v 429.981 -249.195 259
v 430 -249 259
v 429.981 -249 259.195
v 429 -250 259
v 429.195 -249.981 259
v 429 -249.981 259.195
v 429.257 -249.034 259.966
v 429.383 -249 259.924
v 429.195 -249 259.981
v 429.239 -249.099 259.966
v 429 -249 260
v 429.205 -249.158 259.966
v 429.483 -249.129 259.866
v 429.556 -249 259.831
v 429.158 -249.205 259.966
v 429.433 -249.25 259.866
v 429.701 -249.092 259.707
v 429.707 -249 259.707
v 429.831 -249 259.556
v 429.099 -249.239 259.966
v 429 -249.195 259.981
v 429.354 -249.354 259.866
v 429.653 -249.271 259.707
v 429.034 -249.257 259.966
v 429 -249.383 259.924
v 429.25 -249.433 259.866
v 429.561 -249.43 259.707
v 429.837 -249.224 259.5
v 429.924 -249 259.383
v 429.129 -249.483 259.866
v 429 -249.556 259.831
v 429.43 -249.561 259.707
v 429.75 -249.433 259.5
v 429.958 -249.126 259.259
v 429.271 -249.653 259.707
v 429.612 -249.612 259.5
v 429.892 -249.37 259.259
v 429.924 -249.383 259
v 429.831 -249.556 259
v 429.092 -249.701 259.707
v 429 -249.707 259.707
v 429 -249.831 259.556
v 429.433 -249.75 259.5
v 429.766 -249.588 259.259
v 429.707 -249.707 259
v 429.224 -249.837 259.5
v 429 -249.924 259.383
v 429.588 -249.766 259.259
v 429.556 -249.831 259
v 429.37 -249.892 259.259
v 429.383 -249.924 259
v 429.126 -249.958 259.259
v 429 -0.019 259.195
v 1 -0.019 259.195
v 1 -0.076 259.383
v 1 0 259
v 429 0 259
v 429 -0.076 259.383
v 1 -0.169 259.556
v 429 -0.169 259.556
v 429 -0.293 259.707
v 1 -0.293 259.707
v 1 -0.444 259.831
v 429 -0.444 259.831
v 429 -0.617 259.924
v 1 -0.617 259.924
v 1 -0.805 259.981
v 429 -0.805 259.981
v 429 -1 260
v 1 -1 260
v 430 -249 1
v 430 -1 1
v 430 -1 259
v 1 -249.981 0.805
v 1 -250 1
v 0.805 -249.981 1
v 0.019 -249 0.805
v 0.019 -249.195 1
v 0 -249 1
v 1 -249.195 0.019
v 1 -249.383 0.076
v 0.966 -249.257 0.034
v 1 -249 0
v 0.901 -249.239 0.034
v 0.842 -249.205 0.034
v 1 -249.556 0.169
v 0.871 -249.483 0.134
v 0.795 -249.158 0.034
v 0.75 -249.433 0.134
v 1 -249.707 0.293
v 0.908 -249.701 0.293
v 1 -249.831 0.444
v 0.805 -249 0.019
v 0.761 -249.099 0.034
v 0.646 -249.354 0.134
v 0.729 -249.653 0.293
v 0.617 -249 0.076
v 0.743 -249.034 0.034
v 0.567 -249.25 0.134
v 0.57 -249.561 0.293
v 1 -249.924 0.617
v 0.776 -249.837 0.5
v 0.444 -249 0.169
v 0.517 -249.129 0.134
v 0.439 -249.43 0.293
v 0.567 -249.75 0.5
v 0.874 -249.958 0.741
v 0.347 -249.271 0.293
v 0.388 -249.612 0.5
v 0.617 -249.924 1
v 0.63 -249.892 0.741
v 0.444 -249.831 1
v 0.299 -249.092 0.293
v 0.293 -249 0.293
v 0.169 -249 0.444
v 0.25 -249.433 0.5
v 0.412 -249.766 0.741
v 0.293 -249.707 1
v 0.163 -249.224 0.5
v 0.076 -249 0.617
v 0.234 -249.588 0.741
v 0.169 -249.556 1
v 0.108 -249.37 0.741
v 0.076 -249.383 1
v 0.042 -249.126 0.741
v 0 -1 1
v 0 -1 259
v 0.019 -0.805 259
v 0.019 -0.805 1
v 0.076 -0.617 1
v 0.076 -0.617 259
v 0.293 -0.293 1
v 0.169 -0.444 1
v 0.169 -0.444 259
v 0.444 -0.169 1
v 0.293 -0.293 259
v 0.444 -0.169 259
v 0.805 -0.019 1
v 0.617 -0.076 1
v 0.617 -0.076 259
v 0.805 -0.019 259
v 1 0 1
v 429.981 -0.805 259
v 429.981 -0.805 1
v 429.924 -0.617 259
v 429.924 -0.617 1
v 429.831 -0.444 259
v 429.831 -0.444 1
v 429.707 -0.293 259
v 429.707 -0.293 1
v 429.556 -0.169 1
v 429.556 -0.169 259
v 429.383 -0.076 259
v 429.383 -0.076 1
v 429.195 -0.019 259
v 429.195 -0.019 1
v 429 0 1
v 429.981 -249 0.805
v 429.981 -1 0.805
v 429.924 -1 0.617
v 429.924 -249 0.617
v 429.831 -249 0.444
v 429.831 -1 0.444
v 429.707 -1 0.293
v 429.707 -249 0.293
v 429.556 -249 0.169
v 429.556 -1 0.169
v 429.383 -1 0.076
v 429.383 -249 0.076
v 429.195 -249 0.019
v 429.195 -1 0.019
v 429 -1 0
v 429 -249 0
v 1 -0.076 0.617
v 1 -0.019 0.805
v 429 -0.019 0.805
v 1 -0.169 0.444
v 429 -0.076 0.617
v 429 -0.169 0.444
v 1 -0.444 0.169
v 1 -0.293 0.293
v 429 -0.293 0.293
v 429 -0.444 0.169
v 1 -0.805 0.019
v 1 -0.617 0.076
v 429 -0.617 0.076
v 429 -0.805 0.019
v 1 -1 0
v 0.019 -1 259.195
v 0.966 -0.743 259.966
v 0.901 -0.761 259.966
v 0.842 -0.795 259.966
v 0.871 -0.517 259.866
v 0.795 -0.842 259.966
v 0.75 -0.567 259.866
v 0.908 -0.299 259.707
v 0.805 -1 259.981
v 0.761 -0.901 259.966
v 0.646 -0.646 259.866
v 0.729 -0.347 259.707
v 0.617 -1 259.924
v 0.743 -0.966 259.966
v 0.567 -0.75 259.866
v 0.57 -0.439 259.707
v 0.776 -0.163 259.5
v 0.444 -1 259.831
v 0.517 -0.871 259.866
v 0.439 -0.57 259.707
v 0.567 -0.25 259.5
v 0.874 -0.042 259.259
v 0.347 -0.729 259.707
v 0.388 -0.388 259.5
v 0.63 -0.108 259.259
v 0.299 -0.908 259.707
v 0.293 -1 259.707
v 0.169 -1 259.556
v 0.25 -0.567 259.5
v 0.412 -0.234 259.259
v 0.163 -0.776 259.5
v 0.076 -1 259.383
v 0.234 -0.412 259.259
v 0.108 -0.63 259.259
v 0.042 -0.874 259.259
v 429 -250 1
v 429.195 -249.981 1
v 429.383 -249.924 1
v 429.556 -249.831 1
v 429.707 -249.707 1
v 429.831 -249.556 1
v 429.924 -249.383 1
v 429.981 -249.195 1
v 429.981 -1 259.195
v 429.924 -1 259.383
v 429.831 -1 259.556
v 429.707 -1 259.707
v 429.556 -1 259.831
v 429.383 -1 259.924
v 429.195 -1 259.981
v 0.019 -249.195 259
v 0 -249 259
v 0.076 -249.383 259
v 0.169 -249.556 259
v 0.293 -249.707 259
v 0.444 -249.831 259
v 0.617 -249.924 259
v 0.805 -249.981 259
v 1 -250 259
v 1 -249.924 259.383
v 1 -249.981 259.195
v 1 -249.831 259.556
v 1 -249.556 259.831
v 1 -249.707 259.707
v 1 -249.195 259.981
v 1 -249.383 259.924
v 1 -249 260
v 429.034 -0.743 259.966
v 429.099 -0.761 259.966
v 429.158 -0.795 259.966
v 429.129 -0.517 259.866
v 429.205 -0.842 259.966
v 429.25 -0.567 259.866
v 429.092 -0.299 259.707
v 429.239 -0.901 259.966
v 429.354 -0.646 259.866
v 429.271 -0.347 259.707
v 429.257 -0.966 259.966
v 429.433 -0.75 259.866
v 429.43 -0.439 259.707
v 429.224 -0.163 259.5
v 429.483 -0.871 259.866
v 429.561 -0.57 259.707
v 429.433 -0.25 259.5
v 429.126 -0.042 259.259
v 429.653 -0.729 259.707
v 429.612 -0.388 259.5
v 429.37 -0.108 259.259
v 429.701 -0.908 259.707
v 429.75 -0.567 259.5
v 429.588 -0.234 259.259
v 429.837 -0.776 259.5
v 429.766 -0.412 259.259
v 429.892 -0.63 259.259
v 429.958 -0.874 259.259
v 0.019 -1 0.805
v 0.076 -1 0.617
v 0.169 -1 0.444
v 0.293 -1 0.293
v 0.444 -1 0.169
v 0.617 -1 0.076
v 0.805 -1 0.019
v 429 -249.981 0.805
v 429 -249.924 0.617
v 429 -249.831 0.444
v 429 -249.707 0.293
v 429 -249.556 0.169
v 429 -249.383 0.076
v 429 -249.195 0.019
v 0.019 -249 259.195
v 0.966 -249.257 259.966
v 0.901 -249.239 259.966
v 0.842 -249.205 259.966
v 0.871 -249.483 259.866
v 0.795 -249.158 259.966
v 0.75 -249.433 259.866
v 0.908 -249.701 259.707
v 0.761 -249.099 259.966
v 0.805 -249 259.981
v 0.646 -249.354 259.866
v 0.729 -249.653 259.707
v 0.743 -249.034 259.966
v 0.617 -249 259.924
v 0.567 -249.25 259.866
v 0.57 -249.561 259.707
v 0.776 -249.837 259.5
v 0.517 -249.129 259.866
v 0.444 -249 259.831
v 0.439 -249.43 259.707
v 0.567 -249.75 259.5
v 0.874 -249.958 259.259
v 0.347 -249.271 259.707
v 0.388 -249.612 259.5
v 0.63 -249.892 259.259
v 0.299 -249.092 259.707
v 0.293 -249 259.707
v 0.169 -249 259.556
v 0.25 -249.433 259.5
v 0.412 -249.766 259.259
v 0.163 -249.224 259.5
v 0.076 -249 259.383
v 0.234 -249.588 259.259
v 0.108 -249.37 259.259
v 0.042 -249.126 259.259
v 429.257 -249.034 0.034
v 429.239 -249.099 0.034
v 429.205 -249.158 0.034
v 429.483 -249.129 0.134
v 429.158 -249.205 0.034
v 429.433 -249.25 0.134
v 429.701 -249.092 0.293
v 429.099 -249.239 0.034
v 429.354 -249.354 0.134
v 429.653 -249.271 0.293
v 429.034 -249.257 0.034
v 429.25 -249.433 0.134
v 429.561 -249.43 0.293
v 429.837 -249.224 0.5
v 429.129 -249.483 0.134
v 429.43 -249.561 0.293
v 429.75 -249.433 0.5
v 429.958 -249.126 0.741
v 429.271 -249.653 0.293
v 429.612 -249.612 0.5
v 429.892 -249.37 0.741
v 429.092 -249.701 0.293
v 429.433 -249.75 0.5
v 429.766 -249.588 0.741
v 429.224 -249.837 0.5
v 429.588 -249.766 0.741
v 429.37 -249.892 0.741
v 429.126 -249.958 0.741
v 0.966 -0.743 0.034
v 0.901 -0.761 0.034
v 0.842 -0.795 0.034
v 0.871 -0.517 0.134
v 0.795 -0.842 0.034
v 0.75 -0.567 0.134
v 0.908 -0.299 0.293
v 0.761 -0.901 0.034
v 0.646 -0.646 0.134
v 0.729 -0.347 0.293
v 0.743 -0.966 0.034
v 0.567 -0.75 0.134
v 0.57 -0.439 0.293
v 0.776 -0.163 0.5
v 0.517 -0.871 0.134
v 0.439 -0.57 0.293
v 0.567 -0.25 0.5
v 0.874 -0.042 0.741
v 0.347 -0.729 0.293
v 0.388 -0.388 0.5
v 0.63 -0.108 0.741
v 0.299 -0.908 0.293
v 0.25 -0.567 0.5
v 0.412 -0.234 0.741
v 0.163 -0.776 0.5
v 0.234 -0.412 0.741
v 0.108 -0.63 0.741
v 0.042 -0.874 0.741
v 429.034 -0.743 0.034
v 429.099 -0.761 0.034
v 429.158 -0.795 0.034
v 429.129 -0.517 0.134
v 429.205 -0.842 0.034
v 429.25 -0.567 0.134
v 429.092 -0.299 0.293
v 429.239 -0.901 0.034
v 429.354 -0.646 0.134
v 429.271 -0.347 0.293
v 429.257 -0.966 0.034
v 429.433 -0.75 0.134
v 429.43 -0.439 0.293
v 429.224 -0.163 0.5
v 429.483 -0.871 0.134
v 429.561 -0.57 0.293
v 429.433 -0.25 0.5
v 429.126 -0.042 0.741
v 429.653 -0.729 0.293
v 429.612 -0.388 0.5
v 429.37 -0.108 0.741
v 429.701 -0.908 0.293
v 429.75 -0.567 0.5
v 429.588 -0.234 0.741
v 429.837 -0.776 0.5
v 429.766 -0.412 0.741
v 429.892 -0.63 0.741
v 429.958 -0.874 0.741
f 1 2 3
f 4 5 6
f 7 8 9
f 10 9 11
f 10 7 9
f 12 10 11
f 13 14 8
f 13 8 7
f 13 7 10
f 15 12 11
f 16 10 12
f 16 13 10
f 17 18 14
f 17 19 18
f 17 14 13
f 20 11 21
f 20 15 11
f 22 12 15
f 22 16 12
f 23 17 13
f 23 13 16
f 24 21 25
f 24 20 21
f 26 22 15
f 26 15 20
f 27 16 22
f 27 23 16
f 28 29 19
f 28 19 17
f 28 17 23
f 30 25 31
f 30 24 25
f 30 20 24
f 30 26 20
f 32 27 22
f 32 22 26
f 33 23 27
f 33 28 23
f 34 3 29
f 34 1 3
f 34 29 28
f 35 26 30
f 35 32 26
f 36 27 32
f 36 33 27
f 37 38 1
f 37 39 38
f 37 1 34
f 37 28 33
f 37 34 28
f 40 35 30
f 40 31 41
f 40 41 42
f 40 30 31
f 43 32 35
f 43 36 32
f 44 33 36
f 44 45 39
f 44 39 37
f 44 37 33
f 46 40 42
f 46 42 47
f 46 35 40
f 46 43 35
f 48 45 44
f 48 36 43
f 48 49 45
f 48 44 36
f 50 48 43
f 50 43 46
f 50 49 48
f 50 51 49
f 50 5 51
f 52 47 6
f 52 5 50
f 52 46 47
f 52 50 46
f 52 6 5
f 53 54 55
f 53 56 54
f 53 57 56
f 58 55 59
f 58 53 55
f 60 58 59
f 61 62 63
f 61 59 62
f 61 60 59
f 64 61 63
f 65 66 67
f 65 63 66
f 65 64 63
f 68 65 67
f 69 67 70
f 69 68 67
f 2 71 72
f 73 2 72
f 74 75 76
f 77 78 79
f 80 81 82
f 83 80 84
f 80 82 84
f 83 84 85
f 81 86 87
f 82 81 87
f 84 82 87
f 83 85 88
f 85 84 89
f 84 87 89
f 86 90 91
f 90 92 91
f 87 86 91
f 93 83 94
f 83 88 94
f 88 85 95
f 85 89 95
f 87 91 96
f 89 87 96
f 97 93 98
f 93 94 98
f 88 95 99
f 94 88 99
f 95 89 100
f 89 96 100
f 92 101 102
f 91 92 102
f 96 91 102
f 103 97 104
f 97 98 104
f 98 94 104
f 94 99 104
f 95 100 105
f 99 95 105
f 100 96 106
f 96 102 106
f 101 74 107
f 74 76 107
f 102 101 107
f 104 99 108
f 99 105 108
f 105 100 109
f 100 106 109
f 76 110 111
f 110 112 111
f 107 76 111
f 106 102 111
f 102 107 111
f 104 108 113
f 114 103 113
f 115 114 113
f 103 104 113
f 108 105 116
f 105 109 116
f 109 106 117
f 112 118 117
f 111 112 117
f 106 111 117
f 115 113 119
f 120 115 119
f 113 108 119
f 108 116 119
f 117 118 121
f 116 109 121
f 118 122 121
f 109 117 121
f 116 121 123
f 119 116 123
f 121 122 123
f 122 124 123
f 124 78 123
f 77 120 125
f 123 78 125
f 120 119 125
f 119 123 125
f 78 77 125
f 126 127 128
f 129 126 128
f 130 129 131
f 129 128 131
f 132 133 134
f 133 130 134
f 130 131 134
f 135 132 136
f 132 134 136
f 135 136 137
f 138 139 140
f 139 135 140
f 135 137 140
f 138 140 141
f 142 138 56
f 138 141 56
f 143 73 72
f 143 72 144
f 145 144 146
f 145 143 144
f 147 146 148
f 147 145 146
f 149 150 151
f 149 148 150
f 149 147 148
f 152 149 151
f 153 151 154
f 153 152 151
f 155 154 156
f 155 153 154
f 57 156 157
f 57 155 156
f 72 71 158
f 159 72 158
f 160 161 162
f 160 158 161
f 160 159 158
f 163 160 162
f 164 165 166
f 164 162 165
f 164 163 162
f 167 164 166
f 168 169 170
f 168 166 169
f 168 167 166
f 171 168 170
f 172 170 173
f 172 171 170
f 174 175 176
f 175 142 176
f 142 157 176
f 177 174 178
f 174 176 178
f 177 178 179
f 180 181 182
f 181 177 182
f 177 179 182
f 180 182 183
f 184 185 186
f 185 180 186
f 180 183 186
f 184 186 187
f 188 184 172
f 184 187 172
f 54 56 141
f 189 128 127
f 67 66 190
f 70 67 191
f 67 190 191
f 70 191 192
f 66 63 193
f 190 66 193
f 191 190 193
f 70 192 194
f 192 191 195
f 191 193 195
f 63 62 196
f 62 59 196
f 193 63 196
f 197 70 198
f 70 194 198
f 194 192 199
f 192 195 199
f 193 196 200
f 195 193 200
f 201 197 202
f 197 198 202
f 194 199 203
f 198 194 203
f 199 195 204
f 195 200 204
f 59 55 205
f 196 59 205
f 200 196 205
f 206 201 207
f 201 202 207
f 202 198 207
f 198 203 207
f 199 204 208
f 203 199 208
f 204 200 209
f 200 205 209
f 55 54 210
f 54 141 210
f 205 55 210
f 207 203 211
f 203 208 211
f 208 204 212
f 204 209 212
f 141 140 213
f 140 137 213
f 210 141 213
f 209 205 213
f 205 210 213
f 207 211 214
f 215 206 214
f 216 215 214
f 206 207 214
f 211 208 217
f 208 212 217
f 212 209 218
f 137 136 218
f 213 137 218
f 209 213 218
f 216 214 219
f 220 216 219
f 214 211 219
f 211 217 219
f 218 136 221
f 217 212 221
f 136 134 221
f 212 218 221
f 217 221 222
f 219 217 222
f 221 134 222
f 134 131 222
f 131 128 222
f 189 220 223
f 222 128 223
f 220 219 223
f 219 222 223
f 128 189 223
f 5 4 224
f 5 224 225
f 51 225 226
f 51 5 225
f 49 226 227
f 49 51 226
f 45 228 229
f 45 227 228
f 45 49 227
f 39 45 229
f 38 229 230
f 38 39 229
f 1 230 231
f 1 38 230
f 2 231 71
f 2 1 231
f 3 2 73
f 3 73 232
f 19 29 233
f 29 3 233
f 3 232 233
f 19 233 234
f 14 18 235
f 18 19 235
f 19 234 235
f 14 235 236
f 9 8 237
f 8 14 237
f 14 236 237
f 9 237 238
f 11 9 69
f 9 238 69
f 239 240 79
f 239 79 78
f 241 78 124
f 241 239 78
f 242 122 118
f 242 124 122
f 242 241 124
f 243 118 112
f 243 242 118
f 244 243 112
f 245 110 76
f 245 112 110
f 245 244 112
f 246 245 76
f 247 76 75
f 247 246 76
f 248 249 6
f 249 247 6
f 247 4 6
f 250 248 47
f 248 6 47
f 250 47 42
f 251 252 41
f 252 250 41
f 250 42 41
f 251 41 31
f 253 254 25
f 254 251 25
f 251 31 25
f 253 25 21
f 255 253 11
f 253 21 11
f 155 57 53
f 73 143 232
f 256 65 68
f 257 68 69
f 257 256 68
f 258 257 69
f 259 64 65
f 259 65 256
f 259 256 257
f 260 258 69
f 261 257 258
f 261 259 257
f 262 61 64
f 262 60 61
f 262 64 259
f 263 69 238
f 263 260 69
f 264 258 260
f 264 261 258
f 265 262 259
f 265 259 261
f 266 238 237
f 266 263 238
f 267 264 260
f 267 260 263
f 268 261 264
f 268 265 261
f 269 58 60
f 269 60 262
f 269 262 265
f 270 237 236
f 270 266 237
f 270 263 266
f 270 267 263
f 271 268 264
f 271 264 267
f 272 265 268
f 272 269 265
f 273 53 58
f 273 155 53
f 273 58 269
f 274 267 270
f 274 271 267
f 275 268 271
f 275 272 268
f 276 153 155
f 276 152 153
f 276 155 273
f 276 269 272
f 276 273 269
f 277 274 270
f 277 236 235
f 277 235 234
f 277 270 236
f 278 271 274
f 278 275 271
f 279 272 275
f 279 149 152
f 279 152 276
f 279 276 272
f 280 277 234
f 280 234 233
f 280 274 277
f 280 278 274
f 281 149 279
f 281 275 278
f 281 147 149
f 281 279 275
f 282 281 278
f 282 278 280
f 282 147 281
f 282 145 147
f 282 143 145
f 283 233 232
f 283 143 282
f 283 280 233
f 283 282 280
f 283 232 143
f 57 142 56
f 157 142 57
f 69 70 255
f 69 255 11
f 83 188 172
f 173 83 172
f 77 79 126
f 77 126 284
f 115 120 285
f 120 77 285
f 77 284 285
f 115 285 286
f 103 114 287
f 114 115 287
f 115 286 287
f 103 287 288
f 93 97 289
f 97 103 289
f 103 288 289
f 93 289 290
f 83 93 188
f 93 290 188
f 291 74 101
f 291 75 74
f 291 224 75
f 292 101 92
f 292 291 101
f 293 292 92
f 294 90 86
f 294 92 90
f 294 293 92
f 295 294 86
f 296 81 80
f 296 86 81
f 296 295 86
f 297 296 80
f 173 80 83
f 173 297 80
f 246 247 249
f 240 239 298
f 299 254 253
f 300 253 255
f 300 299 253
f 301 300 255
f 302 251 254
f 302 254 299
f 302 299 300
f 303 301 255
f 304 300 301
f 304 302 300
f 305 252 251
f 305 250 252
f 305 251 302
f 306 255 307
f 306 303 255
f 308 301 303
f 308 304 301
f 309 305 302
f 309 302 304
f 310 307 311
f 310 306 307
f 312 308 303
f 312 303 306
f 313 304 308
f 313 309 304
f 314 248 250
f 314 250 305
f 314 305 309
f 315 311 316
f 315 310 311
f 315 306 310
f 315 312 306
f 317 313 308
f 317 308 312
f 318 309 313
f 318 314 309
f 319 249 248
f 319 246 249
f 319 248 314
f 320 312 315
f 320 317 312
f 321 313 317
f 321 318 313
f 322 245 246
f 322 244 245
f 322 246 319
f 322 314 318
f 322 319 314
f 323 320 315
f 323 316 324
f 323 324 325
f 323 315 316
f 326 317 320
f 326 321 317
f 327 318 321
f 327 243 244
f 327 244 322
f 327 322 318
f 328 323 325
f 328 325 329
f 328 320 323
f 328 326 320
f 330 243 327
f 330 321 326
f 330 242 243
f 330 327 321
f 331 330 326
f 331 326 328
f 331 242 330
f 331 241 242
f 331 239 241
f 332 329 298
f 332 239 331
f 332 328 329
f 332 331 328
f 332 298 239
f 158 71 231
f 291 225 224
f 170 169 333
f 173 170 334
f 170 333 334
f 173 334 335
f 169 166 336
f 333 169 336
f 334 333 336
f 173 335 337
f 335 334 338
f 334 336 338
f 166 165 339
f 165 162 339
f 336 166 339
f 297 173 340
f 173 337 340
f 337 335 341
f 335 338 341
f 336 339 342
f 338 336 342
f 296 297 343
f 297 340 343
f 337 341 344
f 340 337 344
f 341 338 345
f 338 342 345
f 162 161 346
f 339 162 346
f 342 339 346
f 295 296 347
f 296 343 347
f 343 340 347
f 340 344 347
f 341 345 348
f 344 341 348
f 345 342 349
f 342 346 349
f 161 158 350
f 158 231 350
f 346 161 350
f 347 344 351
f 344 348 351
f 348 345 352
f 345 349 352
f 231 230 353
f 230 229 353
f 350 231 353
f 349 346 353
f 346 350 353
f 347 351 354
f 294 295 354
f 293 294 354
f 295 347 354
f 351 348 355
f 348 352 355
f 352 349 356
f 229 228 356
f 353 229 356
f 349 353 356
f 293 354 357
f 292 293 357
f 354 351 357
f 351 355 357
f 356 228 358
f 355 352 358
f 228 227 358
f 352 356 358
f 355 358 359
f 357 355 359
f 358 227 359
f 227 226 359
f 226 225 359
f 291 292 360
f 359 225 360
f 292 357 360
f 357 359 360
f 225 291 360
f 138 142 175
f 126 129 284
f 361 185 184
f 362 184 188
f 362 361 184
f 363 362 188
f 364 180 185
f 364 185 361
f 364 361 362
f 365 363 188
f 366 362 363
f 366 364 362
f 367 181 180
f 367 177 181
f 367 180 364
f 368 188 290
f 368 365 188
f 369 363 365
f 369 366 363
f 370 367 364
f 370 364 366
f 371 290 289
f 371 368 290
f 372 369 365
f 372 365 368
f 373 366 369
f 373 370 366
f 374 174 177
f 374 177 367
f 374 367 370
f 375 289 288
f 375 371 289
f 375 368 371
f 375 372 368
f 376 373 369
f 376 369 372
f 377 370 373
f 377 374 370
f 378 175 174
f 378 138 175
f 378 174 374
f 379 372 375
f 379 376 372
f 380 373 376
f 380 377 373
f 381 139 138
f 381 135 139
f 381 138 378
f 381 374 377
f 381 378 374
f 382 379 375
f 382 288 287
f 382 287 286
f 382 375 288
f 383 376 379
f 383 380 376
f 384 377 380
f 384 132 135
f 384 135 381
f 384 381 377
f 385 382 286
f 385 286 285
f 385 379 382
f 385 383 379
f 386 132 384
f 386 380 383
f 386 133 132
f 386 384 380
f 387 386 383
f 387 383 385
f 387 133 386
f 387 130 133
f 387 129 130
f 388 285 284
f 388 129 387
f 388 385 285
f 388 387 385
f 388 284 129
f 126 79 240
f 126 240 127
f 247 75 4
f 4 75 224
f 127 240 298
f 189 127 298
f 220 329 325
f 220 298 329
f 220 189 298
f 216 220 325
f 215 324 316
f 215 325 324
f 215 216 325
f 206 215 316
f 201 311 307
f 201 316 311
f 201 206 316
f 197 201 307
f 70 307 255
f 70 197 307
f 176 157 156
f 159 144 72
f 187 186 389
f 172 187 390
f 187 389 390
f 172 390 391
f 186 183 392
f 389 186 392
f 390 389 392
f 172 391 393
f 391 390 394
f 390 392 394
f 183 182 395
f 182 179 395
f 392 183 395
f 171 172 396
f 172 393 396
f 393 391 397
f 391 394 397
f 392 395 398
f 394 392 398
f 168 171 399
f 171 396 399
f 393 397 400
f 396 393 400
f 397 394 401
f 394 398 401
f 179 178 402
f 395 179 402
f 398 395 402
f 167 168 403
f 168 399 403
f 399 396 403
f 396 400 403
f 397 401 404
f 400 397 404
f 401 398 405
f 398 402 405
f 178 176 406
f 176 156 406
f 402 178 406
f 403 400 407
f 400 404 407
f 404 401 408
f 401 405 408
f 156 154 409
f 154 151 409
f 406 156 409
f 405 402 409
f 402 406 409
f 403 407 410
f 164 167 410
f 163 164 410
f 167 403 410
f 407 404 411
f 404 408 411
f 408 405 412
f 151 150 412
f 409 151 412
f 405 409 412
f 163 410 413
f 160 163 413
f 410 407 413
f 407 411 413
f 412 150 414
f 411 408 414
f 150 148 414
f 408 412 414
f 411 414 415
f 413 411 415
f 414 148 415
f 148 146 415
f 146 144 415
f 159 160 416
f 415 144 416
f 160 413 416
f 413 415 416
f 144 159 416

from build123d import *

# Parameters (mm, degrees)
SKETCH_W  = 430
SKETCH_H  = 250
PAD_DEPTH = 260
FILLET_R  = 1


with BuildPart() as part:
    # Sketch → Pad (new body)
    with BuildSketch(Plane.XY):
        with Locations((215, -125)):
            Rectangle(SKETCH_W, SKETCH_H)
    extrude(amount=PAD_DEPTH)

    # Fillet
    fillet_edges = [part.edges().sort_by_distance(p)[0] for p in [
        (0, 0, 130),
        (430, 0, 130),
        (215, 0, 0),
        (215, 0, 260),
        (430, -250, 130),
        (430, -125, 0),
        (430, -125, 260),
        (0, -250, 130),
        (215, -250, 0),
        (215, -250, 260),
        (0, -125, 0),
        (0, -125, 260),
    ]]
    fillet(fillet_edges, radius=FILLET_R)


solid = part.part
